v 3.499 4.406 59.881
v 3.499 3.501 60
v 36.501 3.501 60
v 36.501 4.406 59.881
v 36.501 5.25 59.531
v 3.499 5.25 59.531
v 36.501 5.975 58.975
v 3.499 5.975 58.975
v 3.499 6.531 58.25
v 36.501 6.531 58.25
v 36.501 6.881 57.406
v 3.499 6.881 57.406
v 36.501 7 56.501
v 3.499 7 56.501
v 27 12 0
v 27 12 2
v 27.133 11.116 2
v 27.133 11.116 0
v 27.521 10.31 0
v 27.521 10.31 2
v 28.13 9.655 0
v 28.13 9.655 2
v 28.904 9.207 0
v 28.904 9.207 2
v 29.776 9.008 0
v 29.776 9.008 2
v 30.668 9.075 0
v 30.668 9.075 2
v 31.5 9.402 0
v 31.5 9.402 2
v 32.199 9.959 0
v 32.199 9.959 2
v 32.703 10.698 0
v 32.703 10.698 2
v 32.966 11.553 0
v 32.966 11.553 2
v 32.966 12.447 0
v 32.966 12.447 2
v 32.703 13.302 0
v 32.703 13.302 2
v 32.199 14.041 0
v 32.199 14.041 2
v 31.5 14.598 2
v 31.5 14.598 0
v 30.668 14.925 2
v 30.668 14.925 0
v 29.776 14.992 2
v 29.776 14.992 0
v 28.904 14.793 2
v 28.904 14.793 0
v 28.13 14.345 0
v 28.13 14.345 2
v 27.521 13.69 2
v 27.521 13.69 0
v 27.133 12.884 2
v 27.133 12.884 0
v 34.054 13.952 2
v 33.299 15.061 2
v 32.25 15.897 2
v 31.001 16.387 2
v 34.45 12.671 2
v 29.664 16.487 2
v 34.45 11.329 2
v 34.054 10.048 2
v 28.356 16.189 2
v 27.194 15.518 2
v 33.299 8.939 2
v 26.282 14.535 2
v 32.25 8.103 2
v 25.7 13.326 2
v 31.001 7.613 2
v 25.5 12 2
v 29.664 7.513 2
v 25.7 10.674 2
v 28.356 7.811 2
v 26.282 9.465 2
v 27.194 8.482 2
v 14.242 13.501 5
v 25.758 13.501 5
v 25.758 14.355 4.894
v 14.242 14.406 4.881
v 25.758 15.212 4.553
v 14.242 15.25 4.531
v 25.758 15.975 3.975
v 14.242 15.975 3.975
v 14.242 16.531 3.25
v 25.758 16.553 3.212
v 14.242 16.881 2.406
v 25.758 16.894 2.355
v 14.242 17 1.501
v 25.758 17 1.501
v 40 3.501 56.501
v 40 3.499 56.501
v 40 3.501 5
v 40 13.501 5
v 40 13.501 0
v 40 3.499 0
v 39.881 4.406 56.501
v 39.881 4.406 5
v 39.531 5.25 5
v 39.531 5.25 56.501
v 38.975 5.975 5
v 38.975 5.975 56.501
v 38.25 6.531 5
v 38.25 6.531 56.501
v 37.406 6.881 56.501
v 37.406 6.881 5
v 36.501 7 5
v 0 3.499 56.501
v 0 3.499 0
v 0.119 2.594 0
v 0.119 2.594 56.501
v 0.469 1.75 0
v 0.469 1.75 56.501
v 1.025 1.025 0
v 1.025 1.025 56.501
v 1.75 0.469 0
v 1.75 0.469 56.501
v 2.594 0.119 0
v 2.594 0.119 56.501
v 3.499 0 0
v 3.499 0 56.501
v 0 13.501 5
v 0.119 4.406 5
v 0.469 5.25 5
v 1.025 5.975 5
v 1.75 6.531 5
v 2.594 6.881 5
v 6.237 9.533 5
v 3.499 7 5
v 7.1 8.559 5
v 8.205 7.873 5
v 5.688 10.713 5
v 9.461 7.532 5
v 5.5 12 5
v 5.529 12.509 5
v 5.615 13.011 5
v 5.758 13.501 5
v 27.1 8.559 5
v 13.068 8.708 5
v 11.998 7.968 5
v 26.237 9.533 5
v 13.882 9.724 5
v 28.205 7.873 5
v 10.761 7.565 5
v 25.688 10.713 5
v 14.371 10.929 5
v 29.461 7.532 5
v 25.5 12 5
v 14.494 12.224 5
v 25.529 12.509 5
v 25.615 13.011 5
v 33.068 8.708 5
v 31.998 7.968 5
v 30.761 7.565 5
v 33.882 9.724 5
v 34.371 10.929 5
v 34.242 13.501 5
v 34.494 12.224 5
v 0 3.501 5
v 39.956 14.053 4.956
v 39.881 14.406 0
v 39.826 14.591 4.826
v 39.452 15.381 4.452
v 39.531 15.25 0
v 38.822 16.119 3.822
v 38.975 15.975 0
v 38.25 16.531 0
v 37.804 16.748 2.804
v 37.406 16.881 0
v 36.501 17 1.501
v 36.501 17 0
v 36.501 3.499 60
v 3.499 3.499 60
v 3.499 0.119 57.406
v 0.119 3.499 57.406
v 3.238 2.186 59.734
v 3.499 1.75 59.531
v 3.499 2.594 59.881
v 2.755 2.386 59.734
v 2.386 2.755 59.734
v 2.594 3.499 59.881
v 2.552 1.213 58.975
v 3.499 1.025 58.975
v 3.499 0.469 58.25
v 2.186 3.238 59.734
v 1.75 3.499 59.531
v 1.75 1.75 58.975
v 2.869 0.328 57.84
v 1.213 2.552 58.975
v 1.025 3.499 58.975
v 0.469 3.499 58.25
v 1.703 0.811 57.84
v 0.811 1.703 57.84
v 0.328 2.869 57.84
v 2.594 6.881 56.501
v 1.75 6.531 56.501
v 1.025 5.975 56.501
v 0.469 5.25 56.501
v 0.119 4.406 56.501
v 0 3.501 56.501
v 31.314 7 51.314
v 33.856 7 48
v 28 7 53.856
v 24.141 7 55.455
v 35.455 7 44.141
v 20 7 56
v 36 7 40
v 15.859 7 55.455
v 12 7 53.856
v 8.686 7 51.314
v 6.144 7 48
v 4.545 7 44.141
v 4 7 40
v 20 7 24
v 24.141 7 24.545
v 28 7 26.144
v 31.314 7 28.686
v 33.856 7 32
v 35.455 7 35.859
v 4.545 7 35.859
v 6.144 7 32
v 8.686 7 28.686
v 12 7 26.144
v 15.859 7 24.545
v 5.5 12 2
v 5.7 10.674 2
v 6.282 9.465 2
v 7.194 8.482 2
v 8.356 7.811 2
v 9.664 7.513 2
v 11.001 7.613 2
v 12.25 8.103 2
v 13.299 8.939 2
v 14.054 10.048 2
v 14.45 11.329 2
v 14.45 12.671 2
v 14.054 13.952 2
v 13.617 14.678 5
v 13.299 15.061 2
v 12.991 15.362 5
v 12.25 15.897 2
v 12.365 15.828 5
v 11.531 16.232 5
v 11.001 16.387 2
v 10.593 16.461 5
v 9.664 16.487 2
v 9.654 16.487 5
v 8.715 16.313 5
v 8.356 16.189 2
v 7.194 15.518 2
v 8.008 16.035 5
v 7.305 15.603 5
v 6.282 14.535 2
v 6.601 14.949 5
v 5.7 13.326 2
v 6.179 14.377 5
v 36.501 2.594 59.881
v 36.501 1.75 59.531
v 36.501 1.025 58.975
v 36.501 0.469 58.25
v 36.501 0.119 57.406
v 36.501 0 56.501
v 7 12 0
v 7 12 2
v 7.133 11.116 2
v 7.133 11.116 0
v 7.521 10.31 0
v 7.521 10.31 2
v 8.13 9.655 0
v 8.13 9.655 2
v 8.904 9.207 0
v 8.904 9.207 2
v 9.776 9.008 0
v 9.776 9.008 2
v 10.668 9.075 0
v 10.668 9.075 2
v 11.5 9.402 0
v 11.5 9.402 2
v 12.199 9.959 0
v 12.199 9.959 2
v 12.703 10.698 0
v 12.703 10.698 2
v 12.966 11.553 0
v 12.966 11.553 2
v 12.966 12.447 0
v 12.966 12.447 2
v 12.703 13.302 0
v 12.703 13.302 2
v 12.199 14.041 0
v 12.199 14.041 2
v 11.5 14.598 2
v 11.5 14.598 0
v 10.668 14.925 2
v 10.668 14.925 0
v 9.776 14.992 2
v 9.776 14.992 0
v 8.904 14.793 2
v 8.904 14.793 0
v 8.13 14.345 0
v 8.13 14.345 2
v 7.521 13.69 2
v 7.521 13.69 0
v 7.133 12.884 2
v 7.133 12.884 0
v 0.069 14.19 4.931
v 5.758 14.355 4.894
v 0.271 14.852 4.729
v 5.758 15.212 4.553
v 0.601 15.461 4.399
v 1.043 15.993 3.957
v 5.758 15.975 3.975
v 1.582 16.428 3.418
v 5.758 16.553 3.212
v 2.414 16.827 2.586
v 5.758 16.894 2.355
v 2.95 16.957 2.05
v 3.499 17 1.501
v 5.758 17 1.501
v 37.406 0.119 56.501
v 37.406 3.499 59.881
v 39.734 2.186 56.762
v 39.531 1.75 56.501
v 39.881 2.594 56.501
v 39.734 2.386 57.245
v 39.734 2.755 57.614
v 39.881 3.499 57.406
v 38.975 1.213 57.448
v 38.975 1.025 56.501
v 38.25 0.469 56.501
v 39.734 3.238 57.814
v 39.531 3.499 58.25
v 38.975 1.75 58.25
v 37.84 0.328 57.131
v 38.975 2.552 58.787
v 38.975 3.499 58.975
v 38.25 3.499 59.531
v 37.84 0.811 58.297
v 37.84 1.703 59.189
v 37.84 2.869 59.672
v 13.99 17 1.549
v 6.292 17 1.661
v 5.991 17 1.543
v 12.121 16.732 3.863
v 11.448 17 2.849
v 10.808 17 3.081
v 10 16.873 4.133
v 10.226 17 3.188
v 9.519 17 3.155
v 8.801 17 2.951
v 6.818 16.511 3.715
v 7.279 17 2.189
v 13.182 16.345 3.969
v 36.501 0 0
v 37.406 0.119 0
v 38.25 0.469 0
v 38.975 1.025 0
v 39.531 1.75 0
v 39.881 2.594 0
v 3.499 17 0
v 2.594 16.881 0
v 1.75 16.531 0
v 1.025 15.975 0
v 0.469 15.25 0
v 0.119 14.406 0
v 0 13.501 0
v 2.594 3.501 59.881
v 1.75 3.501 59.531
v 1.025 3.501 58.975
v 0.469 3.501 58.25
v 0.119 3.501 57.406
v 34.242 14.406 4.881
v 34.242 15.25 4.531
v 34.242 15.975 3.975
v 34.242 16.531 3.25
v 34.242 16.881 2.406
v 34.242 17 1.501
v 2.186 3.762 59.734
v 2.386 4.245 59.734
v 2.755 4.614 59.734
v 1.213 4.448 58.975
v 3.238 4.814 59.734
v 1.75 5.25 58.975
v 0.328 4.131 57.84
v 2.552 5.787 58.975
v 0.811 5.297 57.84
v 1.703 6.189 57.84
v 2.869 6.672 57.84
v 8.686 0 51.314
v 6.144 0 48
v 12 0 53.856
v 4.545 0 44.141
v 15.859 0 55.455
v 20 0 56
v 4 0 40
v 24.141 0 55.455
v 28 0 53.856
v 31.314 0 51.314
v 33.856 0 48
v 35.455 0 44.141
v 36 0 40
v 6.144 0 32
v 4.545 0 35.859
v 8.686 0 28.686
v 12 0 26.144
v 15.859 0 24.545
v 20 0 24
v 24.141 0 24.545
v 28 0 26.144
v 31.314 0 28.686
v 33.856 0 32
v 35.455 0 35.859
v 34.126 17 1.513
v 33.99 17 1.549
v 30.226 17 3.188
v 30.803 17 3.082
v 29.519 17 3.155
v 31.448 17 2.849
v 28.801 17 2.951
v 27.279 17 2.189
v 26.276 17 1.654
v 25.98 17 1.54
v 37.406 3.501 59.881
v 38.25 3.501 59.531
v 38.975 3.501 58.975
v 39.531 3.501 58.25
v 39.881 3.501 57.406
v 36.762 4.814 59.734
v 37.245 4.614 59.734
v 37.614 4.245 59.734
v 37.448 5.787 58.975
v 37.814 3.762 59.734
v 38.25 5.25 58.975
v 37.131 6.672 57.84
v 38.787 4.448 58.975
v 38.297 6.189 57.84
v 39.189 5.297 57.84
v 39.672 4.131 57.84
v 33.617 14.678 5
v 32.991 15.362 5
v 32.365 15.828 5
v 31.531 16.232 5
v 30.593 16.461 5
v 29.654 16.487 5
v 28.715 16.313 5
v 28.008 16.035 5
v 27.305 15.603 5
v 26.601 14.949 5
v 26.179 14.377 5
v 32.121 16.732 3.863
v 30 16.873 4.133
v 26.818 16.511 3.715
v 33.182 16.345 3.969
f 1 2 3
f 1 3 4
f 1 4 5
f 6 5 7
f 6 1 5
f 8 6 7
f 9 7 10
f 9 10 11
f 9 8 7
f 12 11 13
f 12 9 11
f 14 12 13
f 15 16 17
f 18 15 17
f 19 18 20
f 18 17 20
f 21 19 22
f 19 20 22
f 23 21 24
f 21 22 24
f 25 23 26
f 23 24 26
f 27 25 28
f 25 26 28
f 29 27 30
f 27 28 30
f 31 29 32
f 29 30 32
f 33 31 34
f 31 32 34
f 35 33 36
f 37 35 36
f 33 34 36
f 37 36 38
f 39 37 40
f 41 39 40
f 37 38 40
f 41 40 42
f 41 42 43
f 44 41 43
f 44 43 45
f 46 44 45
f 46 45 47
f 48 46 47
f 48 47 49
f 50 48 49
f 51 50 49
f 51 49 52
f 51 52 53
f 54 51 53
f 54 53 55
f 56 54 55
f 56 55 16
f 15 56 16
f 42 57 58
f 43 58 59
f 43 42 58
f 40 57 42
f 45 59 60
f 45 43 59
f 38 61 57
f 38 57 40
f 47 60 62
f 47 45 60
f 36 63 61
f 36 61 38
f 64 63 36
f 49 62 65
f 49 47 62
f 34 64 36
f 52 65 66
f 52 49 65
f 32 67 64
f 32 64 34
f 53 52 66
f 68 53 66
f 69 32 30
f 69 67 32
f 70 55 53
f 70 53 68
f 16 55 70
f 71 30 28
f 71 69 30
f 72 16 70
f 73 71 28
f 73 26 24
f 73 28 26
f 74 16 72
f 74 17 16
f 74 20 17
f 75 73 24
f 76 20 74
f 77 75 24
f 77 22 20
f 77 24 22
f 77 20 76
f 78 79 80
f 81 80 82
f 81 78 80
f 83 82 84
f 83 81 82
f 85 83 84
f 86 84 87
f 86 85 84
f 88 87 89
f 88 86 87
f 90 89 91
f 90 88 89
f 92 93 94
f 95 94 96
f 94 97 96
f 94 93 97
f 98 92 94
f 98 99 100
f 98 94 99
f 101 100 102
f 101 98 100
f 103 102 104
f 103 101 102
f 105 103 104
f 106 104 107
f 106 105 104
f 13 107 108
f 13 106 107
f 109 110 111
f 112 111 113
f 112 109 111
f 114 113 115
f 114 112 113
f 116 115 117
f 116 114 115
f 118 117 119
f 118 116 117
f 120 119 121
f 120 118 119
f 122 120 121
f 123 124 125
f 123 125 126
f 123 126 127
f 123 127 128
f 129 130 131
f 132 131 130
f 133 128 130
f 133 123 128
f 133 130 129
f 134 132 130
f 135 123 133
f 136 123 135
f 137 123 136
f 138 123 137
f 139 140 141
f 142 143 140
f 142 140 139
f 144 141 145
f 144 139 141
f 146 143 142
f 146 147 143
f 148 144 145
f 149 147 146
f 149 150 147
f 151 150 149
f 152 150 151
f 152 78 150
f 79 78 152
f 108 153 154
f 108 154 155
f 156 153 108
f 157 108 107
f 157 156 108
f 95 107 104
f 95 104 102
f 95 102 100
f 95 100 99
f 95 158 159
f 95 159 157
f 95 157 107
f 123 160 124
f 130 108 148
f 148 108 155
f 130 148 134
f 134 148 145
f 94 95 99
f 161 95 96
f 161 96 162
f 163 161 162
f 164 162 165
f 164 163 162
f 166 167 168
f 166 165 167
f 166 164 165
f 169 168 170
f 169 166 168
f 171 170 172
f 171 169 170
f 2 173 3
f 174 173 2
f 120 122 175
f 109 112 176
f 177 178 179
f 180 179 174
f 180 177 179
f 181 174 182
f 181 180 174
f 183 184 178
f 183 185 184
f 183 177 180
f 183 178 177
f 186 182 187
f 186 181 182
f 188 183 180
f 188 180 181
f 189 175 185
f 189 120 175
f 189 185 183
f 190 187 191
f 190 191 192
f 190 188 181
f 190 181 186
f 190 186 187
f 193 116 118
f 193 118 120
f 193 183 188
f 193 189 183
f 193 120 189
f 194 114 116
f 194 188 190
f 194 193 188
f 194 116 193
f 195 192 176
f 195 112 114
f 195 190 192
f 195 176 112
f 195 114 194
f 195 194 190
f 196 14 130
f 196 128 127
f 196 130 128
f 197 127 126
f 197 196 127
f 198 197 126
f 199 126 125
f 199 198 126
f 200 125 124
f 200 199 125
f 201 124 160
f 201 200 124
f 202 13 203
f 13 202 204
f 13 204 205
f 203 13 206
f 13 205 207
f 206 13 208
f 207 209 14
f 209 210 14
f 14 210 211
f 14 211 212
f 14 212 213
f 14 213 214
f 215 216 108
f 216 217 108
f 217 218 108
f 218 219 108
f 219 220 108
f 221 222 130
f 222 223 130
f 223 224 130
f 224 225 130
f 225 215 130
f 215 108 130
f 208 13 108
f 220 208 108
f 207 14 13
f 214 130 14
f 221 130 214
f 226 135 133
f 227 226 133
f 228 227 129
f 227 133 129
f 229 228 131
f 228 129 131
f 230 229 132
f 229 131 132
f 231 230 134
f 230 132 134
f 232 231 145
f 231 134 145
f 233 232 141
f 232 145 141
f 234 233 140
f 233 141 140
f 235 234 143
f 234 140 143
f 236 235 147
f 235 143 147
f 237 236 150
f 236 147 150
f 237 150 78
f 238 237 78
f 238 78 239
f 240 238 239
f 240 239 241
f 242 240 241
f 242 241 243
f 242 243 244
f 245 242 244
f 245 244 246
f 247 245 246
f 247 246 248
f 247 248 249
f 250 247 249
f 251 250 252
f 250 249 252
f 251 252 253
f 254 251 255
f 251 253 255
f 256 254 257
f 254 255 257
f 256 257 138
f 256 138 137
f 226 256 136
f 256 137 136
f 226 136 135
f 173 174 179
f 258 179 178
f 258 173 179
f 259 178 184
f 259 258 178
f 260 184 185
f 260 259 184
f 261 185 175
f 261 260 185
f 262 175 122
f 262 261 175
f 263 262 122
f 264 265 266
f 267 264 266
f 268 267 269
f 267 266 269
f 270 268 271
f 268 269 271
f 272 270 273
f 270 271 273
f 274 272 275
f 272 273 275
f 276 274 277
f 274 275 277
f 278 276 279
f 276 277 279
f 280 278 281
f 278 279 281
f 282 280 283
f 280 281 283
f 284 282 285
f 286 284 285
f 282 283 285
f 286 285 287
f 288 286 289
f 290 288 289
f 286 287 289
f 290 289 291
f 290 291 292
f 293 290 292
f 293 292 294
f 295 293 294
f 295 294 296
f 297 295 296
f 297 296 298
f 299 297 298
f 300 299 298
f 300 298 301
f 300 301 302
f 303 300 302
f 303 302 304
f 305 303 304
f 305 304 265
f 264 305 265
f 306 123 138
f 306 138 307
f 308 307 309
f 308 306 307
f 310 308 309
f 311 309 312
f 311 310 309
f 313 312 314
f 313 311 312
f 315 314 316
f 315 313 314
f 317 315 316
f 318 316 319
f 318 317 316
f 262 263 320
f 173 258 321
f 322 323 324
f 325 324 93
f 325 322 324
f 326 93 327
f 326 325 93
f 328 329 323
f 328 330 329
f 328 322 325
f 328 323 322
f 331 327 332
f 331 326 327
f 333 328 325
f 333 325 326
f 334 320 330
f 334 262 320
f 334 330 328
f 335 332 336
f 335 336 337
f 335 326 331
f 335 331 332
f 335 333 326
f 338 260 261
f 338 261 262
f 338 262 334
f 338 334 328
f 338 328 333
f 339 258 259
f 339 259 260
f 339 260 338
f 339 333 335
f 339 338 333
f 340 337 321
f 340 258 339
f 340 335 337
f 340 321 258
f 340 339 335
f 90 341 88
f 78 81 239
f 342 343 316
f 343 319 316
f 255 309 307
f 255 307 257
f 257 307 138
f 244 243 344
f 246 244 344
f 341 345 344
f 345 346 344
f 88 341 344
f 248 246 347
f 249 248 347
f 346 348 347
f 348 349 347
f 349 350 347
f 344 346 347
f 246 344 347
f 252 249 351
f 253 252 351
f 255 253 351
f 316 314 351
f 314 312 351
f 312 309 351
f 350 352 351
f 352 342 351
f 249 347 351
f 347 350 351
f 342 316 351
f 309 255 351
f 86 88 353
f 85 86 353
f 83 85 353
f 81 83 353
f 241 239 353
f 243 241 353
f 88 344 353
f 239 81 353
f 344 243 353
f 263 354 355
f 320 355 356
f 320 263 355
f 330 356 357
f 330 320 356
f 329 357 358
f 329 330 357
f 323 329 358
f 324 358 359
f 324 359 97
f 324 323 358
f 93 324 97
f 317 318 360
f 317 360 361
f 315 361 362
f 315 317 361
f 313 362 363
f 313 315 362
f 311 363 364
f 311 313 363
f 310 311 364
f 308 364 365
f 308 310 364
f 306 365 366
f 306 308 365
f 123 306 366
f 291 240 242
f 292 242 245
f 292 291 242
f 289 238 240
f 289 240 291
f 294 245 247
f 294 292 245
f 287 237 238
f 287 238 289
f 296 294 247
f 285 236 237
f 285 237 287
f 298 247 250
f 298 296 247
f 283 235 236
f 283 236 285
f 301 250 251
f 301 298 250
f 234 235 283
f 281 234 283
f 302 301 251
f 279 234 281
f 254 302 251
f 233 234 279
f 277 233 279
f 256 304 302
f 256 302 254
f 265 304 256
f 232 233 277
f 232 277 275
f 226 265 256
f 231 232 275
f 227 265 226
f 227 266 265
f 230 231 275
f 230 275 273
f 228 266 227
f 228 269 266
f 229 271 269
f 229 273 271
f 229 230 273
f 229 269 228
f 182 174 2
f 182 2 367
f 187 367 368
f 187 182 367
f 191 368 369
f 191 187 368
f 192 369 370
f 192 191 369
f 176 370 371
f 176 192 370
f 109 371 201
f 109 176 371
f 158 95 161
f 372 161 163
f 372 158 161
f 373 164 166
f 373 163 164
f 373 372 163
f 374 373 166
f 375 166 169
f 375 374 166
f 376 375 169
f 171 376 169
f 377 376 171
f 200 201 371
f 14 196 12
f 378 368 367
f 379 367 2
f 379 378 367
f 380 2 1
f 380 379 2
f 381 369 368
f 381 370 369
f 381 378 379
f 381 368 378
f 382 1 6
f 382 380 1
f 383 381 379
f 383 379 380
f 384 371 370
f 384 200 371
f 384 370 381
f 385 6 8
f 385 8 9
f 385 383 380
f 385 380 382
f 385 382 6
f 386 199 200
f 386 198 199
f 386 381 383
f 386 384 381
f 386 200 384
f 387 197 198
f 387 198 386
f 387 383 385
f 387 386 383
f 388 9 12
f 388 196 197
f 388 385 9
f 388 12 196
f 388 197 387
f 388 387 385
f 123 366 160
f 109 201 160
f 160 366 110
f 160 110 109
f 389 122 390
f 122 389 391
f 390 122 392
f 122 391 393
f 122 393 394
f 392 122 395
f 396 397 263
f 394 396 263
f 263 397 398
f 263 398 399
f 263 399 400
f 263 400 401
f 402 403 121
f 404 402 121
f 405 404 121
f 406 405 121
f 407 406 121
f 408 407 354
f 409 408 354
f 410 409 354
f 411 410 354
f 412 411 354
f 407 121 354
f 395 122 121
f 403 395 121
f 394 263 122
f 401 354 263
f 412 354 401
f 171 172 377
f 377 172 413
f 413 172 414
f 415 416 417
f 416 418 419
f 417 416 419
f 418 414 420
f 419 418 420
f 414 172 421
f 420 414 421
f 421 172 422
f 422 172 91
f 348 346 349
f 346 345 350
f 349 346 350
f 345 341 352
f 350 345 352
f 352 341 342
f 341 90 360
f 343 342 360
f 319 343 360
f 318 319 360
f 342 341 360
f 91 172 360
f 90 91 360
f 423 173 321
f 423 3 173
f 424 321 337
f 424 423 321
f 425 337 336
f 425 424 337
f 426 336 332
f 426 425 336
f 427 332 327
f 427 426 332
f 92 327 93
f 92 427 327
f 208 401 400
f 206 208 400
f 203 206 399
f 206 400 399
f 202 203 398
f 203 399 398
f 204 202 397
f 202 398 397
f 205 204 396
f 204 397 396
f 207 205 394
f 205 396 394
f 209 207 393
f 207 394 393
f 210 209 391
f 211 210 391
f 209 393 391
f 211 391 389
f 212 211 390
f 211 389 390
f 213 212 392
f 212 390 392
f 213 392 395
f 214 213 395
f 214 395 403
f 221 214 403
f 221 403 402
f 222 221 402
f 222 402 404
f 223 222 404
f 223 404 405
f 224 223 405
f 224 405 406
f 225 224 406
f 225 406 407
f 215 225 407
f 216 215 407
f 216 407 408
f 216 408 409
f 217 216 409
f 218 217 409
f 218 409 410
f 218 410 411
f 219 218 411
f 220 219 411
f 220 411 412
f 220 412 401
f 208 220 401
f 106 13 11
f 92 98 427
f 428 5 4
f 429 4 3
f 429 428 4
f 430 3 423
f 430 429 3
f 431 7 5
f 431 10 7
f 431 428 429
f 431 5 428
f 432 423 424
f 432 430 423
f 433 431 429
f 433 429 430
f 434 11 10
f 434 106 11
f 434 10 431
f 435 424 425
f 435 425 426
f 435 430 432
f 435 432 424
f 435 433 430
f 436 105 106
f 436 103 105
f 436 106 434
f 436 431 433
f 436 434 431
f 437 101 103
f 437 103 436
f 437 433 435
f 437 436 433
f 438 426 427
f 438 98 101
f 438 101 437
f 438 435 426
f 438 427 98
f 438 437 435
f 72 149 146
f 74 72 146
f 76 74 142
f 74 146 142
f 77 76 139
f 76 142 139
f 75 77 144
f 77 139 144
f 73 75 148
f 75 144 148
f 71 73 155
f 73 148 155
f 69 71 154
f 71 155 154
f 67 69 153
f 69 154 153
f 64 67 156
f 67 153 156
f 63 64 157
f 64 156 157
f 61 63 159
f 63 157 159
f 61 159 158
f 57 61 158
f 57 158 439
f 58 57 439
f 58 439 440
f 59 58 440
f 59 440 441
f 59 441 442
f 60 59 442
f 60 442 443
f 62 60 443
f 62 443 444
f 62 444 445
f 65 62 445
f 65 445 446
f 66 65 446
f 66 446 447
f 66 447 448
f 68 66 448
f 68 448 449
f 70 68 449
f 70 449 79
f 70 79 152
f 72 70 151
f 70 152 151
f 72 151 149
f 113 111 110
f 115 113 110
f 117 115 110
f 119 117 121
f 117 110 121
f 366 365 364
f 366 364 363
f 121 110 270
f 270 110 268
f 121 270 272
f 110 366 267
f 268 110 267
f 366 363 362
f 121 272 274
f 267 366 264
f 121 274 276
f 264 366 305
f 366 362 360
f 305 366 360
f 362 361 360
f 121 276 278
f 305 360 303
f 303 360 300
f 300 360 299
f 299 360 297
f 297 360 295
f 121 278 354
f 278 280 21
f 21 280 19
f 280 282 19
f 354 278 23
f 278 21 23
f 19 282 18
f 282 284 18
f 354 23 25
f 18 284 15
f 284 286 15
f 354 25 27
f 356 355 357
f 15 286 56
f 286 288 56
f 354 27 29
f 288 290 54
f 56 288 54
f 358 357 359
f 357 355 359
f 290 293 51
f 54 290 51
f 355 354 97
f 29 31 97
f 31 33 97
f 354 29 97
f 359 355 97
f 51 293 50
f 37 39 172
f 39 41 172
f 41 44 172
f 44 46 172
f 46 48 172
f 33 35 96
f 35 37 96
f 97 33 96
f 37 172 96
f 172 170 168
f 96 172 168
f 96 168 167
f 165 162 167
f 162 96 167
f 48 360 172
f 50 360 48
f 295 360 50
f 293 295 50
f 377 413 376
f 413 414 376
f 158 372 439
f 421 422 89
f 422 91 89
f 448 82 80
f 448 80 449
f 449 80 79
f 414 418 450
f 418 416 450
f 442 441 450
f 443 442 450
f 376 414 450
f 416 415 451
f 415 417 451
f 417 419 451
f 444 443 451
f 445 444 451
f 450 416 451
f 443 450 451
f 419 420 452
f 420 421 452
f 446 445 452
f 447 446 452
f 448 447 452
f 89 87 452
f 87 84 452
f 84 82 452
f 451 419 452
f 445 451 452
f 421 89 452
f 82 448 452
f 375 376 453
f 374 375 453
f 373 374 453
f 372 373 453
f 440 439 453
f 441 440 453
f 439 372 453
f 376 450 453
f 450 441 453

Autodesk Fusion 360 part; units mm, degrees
sketch "Sketch1" plane through (0, 0, 0) normal (0, 0, 1) x (1, 0, 0)
  line L0 (0, 0) -> (40, 0)
  line L1 (40, 0) -> (40, 17)
  line L2 (40, 17) -> (0, 17)
  line L3 (0, 17) -> (0, 0)
  dimension "d1" = 40
  dimension "d2" = 17
extrude "Extrude1" add sketch "Sketch1" along normal blind 5
sketch "Sketch2" plane through (0, 0, 5) normal (0, 0, 1) x (-1, 0, 0)
  line L0 (0, -17) -> (0, 0)
  line L1 (0, 0) -> (-40, 0)
  line L2 (-40, 0) -> (-40, -17)
  line L3 (-40, -17) -> (0, -17)
  line L4 (0, 0) -> (-40, 0)
  line L5 (-40, 0) -> (-40, -7)
  line L6 (-40, -7) -> (0, -7)
  line L7 (0, -7) -> (0, 0)
  dimension "d5" = 40
  dimension "d6" = 7
extrude "Extrude2" add sketch "Sketch2" along normal blind 55 contours L0 L1 L2 L4 L5 L6 L7
sketch "Sketch3" plane through (0, 0, 0) normal (0, -1, 0) x (1, 0, 0)
  line L0 (0, 0) -> (40, 0)
  line L1 (40, 0) -> (40, 60)
  line L2 (40, 60) -> (0, 60)
  line L3 (0, 60) -> (0, 0)
  circle A0 centre (20, 40) radius 16
  dimension "d9" = 32
extrude "Extrude3" cut sketch "Sketch3" against normal blind 7 contours A0
sketch "Sketch4" plane through (0, 0, 5) normal (0, 0, 1) x (-1, 0, 0)
  line L0 (0, -7) -> (-40, -7)
  line L1 (-40, -7) -> (-40, -17)
  line L2 (-40, -17) -> (0, -17)
  line L3 (-40, -17) -> (-30, -17)
  line L4 (-30, -17) -> (-30, -7)
  line L5 (-30, -7) -> (-40, -7)
  line L6 (-40, -7) -> (-40, -17)
  circle A0 centre (-30, -12) radius 4.5
  line L7 (-30, -12) -> (-10, -12)
  line L8 (-10, -12) -> (-10, -17)
  line L9 (-10, -17) -> (-30, -17)
  line L10 (-30, -17) -> (-30, -12)
  circle A1 centre (-10, -12) radius 4.5
  line L11 (0, -17) -> (0, -7)
  dimension "d24" = 10
  dimension "d25" = 10
  dimension "d26" = 9
  dimension "d27" = 20
  dimension "d28" = 5
  dimension "d29" = 9
extrude "Extrude7" cut sketch "Sketch4" against normal blind 3 contours L4 A0 L7 | L4 A0 L10 | L4 A0 L7 L10 | L7 L8 A1 | L7 L8 A1
sketch "Sketch7" plane through (0, 0, 5) normal (0, 0, 1) x (-1, 0, 0)
  circle A0 centre (-30, -12) radius 3
  circle A1 centre (-10, -12) radius 3
  dimension "d32" = 6
  dimension "d33" = 6
extrude "Extrude8" cut sketch "Sketch7" against normal blind 5
fillet "Fillet2" radius 3.5 11 edges at (0, 17, 2.5) (40, 7, 32.5) (40, 17, 2.5) (0, 0, 30) (0, 7, 32.5) (0, 3.5, 60) (20, 7, 60) (20, 0, 60) (40, 3.5, 60) (40, 0, 30) (20, 17, 5)
